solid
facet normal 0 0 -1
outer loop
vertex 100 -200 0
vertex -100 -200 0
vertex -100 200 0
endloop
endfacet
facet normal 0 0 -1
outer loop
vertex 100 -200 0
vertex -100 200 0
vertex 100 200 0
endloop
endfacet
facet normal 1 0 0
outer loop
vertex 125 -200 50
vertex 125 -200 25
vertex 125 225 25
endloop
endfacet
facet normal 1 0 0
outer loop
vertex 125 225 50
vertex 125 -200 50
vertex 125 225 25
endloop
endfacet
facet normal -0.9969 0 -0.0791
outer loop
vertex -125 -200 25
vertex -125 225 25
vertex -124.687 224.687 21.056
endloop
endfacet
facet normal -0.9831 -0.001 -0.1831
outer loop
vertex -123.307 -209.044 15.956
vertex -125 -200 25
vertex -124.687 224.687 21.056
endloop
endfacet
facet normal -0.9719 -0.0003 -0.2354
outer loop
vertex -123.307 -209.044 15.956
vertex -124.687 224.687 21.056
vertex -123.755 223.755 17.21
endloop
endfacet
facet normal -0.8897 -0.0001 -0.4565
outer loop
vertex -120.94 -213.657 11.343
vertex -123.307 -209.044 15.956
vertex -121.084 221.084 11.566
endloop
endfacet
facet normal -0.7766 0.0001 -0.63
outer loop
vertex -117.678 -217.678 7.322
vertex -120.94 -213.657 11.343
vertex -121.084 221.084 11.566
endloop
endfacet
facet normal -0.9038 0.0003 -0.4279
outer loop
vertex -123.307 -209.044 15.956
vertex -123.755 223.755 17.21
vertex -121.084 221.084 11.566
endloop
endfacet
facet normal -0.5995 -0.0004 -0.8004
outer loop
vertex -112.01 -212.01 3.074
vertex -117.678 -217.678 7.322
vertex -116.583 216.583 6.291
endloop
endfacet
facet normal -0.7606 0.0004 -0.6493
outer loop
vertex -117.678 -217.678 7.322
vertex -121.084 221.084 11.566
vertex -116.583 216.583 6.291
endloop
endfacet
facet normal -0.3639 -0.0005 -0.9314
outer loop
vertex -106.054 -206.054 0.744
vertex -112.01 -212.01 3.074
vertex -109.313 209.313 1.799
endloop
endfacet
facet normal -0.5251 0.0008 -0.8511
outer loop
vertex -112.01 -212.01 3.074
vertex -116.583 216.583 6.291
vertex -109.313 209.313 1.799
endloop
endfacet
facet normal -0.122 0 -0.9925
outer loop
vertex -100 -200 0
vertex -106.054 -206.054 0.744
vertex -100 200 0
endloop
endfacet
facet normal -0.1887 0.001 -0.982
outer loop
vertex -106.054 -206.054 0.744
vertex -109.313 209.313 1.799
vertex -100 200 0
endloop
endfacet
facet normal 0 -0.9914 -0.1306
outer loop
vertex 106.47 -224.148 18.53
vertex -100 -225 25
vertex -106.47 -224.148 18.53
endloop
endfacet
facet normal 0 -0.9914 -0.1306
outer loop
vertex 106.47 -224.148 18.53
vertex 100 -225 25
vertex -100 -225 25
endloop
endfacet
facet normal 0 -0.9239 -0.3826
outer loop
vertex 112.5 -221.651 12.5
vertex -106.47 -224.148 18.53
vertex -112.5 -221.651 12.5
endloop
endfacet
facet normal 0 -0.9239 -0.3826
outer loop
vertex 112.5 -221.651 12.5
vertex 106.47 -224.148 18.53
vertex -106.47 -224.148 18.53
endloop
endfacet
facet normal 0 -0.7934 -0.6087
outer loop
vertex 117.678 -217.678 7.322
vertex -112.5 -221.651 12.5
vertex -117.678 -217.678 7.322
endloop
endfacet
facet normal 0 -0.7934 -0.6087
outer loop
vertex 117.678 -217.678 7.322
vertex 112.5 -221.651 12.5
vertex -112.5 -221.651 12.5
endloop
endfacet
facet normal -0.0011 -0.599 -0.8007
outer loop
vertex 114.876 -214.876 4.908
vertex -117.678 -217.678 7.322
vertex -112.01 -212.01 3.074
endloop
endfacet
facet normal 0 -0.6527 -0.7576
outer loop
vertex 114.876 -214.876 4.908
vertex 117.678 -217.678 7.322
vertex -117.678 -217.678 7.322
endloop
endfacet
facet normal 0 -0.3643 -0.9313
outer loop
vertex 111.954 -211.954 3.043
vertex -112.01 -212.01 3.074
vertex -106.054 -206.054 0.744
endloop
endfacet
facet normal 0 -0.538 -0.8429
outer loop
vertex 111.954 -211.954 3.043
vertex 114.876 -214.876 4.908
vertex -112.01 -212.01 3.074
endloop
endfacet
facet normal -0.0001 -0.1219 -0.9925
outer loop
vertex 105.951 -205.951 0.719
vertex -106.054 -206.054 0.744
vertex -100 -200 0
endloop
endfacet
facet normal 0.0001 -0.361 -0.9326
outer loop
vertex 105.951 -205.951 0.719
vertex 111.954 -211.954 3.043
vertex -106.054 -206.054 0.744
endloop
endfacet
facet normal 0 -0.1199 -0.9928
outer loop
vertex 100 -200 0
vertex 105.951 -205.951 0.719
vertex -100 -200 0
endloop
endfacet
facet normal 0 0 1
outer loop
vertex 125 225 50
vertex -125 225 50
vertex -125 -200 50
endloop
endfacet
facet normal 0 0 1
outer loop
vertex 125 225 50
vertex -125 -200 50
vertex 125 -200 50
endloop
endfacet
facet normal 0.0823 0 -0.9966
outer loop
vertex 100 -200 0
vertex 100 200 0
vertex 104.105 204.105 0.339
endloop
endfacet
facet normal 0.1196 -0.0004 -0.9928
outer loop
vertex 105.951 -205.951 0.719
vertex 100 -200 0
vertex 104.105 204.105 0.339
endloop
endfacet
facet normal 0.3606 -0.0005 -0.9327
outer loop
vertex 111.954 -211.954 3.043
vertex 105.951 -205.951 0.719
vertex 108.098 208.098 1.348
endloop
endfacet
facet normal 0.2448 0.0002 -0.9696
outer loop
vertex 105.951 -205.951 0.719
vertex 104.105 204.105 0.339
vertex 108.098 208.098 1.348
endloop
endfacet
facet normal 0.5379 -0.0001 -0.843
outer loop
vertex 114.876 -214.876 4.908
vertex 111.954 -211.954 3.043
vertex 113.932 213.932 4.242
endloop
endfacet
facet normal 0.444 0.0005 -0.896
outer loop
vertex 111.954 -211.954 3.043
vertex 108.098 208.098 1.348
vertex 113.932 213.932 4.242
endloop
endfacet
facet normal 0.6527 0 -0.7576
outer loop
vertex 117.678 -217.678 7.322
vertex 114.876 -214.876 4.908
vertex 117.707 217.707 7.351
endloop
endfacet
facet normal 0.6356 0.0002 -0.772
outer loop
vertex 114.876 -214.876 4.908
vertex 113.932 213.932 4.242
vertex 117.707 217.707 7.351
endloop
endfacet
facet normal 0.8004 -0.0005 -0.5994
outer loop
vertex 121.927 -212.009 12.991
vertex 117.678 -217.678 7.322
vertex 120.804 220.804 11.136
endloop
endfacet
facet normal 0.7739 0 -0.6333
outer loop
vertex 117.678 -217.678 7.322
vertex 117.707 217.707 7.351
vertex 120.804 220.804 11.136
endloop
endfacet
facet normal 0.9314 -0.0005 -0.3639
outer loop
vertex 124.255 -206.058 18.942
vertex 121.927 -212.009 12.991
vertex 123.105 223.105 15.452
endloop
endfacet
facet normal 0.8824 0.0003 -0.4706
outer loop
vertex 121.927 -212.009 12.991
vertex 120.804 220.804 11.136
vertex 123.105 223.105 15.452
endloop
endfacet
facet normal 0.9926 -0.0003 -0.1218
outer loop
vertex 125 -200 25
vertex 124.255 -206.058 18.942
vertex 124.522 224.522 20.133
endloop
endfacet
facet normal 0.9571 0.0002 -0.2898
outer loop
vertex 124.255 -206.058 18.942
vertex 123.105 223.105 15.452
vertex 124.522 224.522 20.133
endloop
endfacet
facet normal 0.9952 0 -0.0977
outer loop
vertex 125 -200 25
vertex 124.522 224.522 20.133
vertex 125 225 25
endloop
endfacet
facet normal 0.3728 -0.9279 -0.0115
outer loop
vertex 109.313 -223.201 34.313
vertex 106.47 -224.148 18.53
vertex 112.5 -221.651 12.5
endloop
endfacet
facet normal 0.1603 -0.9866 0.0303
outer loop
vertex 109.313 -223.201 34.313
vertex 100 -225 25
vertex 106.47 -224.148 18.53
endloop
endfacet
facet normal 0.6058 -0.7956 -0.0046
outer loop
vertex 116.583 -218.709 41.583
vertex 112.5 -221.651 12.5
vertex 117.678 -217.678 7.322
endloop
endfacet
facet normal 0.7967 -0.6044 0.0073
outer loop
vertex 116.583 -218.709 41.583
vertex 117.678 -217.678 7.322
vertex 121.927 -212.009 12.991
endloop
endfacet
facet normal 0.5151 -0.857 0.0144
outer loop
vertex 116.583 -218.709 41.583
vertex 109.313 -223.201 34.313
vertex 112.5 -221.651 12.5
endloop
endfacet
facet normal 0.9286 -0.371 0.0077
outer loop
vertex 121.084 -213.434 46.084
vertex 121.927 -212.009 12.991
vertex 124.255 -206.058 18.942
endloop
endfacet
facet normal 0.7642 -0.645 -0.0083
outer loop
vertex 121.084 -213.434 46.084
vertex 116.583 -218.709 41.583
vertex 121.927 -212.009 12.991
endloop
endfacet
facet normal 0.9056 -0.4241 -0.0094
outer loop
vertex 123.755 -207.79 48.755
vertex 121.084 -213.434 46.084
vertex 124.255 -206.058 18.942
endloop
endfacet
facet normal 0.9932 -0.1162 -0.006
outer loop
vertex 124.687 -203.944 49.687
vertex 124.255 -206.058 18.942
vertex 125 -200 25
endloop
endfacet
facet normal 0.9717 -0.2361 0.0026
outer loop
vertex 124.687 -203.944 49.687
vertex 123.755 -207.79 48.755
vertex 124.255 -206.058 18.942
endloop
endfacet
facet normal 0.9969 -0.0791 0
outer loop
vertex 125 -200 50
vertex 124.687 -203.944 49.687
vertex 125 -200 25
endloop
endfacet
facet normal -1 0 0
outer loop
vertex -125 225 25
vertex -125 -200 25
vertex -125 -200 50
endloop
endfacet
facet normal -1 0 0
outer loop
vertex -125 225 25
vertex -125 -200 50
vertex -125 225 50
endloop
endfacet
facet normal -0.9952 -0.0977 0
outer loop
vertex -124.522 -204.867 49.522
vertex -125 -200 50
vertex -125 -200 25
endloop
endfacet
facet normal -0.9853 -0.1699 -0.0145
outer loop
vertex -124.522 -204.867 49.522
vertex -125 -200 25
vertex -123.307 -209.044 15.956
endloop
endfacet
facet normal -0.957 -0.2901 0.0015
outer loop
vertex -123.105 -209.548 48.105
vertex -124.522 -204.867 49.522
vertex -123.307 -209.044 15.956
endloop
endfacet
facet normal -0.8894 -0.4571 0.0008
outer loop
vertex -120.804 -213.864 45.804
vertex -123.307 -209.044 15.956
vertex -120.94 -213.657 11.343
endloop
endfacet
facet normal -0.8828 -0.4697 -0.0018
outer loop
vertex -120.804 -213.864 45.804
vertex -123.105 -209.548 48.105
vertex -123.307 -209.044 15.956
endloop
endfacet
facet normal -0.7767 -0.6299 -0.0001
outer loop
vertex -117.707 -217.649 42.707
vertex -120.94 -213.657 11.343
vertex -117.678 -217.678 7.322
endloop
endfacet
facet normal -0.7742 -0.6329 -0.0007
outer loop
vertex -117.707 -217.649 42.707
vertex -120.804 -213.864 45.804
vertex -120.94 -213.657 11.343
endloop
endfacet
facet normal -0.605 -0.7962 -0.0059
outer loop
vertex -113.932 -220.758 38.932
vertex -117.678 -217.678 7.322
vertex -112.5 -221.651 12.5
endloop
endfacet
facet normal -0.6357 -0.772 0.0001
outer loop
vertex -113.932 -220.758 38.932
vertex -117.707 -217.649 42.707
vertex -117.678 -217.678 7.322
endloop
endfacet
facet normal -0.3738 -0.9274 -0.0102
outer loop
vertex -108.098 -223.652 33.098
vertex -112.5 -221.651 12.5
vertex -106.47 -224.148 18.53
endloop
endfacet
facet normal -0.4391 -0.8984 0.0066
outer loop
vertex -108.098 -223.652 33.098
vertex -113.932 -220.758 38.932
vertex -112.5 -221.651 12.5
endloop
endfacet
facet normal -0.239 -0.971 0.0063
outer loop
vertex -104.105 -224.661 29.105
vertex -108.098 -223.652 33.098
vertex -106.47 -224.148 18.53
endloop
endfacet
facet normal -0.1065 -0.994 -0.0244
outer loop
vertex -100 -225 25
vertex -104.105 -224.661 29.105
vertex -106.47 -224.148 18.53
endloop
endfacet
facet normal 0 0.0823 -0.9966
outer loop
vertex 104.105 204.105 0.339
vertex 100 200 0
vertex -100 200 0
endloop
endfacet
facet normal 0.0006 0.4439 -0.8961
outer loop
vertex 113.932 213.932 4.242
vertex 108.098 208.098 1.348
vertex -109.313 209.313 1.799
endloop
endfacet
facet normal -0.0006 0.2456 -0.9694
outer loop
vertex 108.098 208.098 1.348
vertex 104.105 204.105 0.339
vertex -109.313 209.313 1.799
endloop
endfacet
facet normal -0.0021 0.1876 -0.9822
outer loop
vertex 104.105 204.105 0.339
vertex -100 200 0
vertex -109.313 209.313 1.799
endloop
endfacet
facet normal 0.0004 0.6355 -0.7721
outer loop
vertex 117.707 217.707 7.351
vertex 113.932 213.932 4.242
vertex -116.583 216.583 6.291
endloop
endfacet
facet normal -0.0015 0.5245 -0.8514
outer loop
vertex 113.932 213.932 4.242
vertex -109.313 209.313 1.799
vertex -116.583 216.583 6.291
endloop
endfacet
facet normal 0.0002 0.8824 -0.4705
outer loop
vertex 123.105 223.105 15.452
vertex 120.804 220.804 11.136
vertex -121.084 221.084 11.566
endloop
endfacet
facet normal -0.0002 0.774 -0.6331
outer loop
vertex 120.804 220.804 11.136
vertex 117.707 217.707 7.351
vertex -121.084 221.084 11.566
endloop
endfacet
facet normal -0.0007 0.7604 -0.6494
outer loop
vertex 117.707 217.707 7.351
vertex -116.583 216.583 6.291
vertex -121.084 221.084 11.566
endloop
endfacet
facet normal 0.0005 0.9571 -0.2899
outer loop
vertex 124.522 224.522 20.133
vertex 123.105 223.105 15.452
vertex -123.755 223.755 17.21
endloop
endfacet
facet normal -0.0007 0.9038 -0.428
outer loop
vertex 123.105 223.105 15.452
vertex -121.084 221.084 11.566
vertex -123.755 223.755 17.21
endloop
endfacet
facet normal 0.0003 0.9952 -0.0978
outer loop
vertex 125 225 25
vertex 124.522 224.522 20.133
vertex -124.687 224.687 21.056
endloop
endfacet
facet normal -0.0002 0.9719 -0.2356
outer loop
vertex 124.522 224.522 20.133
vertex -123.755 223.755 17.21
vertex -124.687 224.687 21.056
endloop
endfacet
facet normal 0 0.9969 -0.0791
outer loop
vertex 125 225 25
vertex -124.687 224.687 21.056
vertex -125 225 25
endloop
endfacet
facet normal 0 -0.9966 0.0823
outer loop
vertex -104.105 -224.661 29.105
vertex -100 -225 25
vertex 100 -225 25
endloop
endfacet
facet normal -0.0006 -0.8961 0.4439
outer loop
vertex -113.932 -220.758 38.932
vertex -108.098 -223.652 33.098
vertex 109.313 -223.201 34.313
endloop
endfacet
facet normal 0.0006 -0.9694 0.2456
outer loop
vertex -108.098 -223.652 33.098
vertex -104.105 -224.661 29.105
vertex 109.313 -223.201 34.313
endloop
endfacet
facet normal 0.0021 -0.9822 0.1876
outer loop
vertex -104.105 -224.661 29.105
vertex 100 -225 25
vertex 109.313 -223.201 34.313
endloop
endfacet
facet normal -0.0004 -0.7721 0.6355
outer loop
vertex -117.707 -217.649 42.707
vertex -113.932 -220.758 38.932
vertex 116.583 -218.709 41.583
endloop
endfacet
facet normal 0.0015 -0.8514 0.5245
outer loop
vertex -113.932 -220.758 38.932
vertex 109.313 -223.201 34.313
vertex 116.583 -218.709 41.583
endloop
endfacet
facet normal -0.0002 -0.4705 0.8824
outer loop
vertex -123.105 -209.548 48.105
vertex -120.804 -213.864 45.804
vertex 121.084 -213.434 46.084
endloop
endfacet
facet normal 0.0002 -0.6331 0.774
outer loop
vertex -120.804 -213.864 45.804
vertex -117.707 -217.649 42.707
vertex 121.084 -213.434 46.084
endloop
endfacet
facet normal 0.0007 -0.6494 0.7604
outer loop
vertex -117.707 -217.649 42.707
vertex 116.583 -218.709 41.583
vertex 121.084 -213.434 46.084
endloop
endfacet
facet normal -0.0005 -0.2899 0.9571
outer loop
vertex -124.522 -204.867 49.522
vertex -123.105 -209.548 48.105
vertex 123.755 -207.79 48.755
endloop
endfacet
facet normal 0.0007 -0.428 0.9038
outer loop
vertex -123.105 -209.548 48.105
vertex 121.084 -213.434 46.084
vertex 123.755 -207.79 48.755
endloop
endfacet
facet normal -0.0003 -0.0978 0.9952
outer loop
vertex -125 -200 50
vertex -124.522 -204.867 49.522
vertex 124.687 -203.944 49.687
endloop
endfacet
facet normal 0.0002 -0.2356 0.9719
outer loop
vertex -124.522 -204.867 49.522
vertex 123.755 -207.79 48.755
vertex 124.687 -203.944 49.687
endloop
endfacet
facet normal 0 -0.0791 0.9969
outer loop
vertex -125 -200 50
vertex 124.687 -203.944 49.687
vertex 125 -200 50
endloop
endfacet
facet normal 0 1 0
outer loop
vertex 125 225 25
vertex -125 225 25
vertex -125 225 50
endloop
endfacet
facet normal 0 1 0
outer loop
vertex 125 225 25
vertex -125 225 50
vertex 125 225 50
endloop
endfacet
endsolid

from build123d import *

# Parameters (mm, degrees)
F0_W        = 250
F0_H        = 450
F1_DEPTH    = 50
F2_R        = 24.99999
F3_T1_DEPTH = 550.00001
F3_T3_DEPTH = 375


# Not quite as in the source:
# - a fillet or chamfer that OpenCascade refuses, or shapes differently, is made with other operations: its cross-section is extruded or revolved along the edge and cut away or added
# - a fillet or chamfer is up to 0.001 mm smaller than in the source, because OpenCascade refuses the exact size


with BuildPart() as f1:
    # F0 (on Top) → F1 (new body)
    with BuildSketch(Plane.XY):
        Rectangle(F0_W, F0_H)
    extrude(amount=F1_DEPTH)

    # F2 (radius 25 in the source; OpenCascade refuses exactly that, so slightly less here)
    f2_edges = [f1.edges().sort_by_distance(p)[0] for p in [
        (-125, -225, 25),
        (125, -225, 25),
        (0, -225, 0),
        (0, -225, 50),
    ]]
    fillet(f2_edges, radius=F2_R)

    # F3: fillet of radius 25 on 4 edges, made by hand

    # F3_s2 → F3_t1 (cut)
    with BuildSketch(Plane.XZ.offset(-287.5)):
        with BuildLine():
            ThreePointArc((-125, 25), (-117.6776695297, 7.3223304703), (-100, 0))
            Line((-100, 0), (-125, 0))
            Line((-125, 0), (-125, 25))
        make_face()
        with BuildLine():
            ThreePointArc((100, 0), (117.6776695297, 7.3223304703), (125, 25))
            Line((125, 25), (125, 0))
            Line((125, 0), (100, 0))
        make_face()
    extrude(amount=F3_T1_DEPTH, mode=Mode.SUBTRACT)

    # F3_s4 → F3_t3 (cut)
    with BuildSketch(Plane.YZ.offset(-187.5)):
        with BuildLine():
            ThreePointArc((200, 0), (217.6776695297, 7.3223304703), (225, 25))
            Line((225, 25), (225, 0))
            Line((225, 0), (200, 0))
        make_face()
    extrude(amount=F3_T3_DEPTH, mode=Mode.SUBTRACT)


solid = f1.part
